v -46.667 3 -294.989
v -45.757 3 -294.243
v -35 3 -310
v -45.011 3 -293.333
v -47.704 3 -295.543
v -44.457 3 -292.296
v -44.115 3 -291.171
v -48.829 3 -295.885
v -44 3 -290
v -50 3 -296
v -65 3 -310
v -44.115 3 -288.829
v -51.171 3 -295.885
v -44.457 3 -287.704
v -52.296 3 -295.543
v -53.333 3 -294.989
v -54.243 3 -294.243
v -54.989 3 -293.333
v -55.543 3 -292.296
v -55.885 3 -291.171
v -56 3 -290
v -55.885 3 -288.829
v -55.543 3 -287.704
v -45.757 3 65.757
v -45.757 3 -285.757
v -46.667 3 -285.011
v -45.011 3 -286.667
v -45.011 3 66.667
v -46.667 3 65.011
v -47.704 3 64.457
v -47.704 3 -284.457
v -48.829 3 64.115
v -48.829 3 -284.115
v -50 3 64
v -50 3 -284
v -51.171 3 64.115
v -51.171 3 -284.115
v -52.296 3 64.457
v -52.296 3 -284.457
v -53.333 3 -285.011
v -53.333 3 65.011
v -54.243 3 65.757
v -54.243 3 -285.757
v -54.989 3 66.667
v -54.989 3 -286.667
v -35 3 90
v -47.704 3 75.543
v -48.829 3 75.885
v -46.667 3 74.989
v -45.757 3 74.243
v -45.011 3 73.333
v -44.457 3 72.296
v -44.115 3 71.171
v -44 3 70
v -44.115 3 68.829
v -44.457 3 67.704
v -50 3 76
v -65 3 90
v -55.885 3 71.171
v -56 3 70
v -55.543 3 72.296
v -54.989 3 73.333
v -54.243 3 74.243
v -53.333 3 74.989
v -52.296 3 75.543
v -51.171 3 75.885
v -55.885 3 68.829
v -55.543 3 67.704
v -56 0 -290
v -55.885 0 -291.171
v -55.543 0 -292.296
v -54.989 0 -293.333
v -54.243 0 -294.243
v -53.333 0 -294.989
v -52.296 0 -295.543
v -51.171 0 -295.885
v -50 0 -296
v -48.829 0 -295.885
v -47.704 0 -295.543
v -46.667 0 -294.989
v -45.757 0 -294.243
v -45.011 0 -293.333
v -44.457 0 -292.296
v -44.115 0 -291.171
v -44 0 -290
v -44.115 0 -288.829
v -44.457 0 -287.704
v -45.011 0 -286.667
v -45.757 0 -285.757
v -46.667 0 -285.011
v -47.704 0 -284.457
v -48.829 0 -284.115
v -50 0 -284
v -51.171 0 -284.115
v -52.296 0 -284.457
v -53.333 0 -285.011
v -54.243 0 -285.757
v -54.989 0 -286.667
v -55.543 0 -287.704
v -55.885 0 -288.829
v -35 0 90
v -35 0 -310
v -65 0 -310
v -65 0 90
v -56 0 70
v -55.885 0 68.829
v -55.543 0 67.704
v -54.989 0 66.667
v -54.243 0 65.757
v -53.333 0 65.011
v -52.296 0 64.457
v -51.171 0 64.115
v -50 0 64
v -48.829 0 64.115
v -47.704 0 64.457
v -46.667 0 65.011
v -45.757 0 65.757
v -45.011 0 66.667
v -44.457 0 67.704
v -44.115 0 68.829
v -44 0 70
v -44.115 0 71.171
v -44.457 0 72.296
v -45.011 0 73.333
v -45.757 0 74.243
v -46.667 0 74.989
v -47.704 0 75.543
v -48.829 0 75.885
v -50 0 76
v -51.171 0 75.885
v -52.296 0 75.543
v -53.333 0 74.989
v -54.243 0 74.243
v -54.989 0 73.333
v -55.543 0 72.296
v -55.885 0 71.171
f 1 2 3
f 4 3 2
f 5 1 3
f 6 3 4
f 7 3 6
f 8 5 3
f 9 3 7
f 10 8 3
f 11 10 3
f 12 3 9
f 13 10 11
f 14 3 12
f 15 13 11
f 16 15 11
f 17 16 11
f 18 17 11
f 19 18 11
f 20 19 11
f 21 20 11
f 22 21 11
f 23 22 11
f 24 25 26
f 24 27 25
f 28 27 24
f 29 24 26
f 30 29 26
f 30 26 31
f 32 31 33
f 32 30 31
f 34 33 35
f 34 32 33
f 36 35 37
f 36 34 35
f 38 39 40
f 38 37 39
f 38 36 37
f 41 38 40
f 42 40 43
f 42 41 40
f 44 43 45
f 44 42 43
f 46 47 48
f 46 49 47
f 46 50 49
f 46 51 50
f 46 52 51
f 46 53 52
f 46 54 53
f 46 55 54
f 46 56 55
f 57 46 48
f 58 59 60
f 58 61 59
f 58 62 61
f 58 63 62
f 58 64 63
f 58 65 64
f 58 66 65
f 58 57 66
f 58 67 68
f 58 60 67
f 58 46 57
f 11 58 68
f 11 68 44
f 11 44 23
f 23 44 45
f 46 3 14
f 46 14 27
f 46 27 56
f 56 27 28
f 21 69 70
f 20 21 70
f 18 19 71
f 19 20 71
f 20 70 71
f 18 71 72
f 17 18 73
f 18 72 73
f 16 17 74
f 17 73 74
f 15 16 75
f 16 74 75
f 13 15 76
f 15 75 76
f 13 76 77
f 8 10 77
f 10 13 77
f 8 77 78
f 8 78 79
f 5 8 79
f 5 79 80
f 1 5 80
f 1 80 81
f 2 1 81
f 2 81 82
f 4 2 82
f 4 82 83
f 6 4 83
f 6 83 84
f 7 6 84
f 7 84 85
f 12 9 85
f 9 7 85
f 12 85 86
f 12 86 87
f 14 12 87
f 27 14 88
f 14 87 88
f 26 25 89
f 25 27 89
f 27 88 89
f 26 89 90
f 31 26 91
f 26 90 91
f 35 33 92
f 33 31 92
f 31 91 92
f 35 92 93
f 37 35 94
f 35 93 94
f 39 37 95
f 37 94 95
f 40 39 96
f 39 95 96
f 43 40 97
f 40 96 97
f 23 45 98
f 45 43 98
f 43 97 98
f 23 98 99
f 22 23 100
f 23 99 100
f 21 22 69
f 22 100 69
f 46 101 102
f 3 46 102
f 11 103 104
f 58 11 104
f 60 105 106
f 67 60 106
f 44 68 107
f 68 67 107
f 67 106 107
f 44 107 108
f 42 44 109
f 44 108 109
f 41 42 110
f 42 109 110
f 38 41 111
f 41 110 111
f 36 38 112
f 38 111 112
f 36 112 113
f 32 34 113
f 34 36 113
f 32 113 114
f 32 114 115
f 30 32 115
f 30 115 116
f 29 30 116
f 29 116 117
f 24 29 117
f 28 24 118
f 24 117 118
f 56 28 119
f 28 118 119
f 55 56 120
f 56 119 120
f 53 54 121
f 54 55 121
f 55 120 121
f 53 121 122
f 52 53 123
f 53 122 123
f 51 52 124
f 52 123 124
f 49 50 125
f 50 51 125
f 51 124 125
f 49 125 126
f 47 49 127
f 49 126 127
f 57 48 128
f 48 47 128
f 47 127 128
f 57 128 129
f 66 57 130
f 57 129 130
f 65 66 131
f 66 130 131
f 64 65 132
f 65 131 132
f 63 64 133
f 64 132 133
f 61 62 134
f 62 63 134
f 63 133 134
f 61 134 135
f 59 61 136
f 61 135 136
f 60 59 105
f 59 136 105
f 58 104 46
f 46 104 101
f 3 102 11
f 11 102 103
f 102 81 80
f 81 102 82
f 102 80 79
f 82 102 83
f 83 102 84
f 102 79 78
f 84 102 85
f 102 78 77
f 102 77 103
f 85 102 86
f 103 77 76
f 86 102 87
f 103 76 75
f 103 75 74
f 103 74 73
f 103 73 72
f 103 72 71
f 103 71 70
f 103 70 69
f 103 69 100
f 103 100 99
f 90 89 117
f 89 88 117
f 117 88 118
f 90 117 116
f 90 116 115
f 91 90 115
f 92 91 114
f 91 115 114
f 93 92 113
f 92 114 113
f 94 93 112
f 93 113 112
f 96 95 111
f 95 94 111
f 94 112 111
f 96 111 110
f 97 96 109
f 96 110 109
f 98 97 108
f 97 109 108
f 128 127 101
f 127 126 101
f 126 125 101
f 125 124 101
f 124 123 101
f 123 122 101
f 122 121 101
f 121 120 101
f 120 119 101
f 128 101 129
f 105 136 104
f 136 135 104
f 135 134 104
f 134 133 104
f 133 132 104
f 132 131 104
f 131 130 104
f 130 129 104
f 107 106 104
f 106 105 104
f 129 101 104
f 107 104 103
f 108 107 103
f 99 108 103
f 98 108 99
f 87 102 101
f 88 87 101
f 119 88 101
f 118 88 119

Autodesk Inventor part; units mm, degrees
ref_plane "YZ Plane" through (0, 0, 0) normal (1, 0, 0) x (0, 1, 0)
ref_plane "XZ Plane" through (0, 0, 0) normal (0, 1, 0) x (-1, 0, 0)
ref_plane "XY Plane" through (0, 0, 0) normal (0, 0, 1) x (1, 0, 0)
sketch "Sketch1" plane through (0, 0, 0) normal (0, 1, 0) x (-1, 0, 0)
  line L0 (65, 90) -> (35, 90)
  line L1 (35, 90) -> (35, -310)
  line L2 (35, -310) -> (65, -310)
  line L3 (65, -310) -> (65, 90)
  line L4 (50, 90) -> (50, -310) construction
  circle A0 centre (50, 70) radius 6
  circle A1 centre (50, -290) radius 6
  point P0 (0, 0)
  dimension "d0" = 30
  dimension "d1" = 400
  dimension "d2" = 35
  dimension "d3" = 90
  dimension "d6" = 12
  dimension "d7" = 12
  dimension "d8" = 20
  dimension "d9" = 20
extrude "Extrusion1" add sketch "Sketch1" along normal blind 3
properties part number "rig_connector_long"
